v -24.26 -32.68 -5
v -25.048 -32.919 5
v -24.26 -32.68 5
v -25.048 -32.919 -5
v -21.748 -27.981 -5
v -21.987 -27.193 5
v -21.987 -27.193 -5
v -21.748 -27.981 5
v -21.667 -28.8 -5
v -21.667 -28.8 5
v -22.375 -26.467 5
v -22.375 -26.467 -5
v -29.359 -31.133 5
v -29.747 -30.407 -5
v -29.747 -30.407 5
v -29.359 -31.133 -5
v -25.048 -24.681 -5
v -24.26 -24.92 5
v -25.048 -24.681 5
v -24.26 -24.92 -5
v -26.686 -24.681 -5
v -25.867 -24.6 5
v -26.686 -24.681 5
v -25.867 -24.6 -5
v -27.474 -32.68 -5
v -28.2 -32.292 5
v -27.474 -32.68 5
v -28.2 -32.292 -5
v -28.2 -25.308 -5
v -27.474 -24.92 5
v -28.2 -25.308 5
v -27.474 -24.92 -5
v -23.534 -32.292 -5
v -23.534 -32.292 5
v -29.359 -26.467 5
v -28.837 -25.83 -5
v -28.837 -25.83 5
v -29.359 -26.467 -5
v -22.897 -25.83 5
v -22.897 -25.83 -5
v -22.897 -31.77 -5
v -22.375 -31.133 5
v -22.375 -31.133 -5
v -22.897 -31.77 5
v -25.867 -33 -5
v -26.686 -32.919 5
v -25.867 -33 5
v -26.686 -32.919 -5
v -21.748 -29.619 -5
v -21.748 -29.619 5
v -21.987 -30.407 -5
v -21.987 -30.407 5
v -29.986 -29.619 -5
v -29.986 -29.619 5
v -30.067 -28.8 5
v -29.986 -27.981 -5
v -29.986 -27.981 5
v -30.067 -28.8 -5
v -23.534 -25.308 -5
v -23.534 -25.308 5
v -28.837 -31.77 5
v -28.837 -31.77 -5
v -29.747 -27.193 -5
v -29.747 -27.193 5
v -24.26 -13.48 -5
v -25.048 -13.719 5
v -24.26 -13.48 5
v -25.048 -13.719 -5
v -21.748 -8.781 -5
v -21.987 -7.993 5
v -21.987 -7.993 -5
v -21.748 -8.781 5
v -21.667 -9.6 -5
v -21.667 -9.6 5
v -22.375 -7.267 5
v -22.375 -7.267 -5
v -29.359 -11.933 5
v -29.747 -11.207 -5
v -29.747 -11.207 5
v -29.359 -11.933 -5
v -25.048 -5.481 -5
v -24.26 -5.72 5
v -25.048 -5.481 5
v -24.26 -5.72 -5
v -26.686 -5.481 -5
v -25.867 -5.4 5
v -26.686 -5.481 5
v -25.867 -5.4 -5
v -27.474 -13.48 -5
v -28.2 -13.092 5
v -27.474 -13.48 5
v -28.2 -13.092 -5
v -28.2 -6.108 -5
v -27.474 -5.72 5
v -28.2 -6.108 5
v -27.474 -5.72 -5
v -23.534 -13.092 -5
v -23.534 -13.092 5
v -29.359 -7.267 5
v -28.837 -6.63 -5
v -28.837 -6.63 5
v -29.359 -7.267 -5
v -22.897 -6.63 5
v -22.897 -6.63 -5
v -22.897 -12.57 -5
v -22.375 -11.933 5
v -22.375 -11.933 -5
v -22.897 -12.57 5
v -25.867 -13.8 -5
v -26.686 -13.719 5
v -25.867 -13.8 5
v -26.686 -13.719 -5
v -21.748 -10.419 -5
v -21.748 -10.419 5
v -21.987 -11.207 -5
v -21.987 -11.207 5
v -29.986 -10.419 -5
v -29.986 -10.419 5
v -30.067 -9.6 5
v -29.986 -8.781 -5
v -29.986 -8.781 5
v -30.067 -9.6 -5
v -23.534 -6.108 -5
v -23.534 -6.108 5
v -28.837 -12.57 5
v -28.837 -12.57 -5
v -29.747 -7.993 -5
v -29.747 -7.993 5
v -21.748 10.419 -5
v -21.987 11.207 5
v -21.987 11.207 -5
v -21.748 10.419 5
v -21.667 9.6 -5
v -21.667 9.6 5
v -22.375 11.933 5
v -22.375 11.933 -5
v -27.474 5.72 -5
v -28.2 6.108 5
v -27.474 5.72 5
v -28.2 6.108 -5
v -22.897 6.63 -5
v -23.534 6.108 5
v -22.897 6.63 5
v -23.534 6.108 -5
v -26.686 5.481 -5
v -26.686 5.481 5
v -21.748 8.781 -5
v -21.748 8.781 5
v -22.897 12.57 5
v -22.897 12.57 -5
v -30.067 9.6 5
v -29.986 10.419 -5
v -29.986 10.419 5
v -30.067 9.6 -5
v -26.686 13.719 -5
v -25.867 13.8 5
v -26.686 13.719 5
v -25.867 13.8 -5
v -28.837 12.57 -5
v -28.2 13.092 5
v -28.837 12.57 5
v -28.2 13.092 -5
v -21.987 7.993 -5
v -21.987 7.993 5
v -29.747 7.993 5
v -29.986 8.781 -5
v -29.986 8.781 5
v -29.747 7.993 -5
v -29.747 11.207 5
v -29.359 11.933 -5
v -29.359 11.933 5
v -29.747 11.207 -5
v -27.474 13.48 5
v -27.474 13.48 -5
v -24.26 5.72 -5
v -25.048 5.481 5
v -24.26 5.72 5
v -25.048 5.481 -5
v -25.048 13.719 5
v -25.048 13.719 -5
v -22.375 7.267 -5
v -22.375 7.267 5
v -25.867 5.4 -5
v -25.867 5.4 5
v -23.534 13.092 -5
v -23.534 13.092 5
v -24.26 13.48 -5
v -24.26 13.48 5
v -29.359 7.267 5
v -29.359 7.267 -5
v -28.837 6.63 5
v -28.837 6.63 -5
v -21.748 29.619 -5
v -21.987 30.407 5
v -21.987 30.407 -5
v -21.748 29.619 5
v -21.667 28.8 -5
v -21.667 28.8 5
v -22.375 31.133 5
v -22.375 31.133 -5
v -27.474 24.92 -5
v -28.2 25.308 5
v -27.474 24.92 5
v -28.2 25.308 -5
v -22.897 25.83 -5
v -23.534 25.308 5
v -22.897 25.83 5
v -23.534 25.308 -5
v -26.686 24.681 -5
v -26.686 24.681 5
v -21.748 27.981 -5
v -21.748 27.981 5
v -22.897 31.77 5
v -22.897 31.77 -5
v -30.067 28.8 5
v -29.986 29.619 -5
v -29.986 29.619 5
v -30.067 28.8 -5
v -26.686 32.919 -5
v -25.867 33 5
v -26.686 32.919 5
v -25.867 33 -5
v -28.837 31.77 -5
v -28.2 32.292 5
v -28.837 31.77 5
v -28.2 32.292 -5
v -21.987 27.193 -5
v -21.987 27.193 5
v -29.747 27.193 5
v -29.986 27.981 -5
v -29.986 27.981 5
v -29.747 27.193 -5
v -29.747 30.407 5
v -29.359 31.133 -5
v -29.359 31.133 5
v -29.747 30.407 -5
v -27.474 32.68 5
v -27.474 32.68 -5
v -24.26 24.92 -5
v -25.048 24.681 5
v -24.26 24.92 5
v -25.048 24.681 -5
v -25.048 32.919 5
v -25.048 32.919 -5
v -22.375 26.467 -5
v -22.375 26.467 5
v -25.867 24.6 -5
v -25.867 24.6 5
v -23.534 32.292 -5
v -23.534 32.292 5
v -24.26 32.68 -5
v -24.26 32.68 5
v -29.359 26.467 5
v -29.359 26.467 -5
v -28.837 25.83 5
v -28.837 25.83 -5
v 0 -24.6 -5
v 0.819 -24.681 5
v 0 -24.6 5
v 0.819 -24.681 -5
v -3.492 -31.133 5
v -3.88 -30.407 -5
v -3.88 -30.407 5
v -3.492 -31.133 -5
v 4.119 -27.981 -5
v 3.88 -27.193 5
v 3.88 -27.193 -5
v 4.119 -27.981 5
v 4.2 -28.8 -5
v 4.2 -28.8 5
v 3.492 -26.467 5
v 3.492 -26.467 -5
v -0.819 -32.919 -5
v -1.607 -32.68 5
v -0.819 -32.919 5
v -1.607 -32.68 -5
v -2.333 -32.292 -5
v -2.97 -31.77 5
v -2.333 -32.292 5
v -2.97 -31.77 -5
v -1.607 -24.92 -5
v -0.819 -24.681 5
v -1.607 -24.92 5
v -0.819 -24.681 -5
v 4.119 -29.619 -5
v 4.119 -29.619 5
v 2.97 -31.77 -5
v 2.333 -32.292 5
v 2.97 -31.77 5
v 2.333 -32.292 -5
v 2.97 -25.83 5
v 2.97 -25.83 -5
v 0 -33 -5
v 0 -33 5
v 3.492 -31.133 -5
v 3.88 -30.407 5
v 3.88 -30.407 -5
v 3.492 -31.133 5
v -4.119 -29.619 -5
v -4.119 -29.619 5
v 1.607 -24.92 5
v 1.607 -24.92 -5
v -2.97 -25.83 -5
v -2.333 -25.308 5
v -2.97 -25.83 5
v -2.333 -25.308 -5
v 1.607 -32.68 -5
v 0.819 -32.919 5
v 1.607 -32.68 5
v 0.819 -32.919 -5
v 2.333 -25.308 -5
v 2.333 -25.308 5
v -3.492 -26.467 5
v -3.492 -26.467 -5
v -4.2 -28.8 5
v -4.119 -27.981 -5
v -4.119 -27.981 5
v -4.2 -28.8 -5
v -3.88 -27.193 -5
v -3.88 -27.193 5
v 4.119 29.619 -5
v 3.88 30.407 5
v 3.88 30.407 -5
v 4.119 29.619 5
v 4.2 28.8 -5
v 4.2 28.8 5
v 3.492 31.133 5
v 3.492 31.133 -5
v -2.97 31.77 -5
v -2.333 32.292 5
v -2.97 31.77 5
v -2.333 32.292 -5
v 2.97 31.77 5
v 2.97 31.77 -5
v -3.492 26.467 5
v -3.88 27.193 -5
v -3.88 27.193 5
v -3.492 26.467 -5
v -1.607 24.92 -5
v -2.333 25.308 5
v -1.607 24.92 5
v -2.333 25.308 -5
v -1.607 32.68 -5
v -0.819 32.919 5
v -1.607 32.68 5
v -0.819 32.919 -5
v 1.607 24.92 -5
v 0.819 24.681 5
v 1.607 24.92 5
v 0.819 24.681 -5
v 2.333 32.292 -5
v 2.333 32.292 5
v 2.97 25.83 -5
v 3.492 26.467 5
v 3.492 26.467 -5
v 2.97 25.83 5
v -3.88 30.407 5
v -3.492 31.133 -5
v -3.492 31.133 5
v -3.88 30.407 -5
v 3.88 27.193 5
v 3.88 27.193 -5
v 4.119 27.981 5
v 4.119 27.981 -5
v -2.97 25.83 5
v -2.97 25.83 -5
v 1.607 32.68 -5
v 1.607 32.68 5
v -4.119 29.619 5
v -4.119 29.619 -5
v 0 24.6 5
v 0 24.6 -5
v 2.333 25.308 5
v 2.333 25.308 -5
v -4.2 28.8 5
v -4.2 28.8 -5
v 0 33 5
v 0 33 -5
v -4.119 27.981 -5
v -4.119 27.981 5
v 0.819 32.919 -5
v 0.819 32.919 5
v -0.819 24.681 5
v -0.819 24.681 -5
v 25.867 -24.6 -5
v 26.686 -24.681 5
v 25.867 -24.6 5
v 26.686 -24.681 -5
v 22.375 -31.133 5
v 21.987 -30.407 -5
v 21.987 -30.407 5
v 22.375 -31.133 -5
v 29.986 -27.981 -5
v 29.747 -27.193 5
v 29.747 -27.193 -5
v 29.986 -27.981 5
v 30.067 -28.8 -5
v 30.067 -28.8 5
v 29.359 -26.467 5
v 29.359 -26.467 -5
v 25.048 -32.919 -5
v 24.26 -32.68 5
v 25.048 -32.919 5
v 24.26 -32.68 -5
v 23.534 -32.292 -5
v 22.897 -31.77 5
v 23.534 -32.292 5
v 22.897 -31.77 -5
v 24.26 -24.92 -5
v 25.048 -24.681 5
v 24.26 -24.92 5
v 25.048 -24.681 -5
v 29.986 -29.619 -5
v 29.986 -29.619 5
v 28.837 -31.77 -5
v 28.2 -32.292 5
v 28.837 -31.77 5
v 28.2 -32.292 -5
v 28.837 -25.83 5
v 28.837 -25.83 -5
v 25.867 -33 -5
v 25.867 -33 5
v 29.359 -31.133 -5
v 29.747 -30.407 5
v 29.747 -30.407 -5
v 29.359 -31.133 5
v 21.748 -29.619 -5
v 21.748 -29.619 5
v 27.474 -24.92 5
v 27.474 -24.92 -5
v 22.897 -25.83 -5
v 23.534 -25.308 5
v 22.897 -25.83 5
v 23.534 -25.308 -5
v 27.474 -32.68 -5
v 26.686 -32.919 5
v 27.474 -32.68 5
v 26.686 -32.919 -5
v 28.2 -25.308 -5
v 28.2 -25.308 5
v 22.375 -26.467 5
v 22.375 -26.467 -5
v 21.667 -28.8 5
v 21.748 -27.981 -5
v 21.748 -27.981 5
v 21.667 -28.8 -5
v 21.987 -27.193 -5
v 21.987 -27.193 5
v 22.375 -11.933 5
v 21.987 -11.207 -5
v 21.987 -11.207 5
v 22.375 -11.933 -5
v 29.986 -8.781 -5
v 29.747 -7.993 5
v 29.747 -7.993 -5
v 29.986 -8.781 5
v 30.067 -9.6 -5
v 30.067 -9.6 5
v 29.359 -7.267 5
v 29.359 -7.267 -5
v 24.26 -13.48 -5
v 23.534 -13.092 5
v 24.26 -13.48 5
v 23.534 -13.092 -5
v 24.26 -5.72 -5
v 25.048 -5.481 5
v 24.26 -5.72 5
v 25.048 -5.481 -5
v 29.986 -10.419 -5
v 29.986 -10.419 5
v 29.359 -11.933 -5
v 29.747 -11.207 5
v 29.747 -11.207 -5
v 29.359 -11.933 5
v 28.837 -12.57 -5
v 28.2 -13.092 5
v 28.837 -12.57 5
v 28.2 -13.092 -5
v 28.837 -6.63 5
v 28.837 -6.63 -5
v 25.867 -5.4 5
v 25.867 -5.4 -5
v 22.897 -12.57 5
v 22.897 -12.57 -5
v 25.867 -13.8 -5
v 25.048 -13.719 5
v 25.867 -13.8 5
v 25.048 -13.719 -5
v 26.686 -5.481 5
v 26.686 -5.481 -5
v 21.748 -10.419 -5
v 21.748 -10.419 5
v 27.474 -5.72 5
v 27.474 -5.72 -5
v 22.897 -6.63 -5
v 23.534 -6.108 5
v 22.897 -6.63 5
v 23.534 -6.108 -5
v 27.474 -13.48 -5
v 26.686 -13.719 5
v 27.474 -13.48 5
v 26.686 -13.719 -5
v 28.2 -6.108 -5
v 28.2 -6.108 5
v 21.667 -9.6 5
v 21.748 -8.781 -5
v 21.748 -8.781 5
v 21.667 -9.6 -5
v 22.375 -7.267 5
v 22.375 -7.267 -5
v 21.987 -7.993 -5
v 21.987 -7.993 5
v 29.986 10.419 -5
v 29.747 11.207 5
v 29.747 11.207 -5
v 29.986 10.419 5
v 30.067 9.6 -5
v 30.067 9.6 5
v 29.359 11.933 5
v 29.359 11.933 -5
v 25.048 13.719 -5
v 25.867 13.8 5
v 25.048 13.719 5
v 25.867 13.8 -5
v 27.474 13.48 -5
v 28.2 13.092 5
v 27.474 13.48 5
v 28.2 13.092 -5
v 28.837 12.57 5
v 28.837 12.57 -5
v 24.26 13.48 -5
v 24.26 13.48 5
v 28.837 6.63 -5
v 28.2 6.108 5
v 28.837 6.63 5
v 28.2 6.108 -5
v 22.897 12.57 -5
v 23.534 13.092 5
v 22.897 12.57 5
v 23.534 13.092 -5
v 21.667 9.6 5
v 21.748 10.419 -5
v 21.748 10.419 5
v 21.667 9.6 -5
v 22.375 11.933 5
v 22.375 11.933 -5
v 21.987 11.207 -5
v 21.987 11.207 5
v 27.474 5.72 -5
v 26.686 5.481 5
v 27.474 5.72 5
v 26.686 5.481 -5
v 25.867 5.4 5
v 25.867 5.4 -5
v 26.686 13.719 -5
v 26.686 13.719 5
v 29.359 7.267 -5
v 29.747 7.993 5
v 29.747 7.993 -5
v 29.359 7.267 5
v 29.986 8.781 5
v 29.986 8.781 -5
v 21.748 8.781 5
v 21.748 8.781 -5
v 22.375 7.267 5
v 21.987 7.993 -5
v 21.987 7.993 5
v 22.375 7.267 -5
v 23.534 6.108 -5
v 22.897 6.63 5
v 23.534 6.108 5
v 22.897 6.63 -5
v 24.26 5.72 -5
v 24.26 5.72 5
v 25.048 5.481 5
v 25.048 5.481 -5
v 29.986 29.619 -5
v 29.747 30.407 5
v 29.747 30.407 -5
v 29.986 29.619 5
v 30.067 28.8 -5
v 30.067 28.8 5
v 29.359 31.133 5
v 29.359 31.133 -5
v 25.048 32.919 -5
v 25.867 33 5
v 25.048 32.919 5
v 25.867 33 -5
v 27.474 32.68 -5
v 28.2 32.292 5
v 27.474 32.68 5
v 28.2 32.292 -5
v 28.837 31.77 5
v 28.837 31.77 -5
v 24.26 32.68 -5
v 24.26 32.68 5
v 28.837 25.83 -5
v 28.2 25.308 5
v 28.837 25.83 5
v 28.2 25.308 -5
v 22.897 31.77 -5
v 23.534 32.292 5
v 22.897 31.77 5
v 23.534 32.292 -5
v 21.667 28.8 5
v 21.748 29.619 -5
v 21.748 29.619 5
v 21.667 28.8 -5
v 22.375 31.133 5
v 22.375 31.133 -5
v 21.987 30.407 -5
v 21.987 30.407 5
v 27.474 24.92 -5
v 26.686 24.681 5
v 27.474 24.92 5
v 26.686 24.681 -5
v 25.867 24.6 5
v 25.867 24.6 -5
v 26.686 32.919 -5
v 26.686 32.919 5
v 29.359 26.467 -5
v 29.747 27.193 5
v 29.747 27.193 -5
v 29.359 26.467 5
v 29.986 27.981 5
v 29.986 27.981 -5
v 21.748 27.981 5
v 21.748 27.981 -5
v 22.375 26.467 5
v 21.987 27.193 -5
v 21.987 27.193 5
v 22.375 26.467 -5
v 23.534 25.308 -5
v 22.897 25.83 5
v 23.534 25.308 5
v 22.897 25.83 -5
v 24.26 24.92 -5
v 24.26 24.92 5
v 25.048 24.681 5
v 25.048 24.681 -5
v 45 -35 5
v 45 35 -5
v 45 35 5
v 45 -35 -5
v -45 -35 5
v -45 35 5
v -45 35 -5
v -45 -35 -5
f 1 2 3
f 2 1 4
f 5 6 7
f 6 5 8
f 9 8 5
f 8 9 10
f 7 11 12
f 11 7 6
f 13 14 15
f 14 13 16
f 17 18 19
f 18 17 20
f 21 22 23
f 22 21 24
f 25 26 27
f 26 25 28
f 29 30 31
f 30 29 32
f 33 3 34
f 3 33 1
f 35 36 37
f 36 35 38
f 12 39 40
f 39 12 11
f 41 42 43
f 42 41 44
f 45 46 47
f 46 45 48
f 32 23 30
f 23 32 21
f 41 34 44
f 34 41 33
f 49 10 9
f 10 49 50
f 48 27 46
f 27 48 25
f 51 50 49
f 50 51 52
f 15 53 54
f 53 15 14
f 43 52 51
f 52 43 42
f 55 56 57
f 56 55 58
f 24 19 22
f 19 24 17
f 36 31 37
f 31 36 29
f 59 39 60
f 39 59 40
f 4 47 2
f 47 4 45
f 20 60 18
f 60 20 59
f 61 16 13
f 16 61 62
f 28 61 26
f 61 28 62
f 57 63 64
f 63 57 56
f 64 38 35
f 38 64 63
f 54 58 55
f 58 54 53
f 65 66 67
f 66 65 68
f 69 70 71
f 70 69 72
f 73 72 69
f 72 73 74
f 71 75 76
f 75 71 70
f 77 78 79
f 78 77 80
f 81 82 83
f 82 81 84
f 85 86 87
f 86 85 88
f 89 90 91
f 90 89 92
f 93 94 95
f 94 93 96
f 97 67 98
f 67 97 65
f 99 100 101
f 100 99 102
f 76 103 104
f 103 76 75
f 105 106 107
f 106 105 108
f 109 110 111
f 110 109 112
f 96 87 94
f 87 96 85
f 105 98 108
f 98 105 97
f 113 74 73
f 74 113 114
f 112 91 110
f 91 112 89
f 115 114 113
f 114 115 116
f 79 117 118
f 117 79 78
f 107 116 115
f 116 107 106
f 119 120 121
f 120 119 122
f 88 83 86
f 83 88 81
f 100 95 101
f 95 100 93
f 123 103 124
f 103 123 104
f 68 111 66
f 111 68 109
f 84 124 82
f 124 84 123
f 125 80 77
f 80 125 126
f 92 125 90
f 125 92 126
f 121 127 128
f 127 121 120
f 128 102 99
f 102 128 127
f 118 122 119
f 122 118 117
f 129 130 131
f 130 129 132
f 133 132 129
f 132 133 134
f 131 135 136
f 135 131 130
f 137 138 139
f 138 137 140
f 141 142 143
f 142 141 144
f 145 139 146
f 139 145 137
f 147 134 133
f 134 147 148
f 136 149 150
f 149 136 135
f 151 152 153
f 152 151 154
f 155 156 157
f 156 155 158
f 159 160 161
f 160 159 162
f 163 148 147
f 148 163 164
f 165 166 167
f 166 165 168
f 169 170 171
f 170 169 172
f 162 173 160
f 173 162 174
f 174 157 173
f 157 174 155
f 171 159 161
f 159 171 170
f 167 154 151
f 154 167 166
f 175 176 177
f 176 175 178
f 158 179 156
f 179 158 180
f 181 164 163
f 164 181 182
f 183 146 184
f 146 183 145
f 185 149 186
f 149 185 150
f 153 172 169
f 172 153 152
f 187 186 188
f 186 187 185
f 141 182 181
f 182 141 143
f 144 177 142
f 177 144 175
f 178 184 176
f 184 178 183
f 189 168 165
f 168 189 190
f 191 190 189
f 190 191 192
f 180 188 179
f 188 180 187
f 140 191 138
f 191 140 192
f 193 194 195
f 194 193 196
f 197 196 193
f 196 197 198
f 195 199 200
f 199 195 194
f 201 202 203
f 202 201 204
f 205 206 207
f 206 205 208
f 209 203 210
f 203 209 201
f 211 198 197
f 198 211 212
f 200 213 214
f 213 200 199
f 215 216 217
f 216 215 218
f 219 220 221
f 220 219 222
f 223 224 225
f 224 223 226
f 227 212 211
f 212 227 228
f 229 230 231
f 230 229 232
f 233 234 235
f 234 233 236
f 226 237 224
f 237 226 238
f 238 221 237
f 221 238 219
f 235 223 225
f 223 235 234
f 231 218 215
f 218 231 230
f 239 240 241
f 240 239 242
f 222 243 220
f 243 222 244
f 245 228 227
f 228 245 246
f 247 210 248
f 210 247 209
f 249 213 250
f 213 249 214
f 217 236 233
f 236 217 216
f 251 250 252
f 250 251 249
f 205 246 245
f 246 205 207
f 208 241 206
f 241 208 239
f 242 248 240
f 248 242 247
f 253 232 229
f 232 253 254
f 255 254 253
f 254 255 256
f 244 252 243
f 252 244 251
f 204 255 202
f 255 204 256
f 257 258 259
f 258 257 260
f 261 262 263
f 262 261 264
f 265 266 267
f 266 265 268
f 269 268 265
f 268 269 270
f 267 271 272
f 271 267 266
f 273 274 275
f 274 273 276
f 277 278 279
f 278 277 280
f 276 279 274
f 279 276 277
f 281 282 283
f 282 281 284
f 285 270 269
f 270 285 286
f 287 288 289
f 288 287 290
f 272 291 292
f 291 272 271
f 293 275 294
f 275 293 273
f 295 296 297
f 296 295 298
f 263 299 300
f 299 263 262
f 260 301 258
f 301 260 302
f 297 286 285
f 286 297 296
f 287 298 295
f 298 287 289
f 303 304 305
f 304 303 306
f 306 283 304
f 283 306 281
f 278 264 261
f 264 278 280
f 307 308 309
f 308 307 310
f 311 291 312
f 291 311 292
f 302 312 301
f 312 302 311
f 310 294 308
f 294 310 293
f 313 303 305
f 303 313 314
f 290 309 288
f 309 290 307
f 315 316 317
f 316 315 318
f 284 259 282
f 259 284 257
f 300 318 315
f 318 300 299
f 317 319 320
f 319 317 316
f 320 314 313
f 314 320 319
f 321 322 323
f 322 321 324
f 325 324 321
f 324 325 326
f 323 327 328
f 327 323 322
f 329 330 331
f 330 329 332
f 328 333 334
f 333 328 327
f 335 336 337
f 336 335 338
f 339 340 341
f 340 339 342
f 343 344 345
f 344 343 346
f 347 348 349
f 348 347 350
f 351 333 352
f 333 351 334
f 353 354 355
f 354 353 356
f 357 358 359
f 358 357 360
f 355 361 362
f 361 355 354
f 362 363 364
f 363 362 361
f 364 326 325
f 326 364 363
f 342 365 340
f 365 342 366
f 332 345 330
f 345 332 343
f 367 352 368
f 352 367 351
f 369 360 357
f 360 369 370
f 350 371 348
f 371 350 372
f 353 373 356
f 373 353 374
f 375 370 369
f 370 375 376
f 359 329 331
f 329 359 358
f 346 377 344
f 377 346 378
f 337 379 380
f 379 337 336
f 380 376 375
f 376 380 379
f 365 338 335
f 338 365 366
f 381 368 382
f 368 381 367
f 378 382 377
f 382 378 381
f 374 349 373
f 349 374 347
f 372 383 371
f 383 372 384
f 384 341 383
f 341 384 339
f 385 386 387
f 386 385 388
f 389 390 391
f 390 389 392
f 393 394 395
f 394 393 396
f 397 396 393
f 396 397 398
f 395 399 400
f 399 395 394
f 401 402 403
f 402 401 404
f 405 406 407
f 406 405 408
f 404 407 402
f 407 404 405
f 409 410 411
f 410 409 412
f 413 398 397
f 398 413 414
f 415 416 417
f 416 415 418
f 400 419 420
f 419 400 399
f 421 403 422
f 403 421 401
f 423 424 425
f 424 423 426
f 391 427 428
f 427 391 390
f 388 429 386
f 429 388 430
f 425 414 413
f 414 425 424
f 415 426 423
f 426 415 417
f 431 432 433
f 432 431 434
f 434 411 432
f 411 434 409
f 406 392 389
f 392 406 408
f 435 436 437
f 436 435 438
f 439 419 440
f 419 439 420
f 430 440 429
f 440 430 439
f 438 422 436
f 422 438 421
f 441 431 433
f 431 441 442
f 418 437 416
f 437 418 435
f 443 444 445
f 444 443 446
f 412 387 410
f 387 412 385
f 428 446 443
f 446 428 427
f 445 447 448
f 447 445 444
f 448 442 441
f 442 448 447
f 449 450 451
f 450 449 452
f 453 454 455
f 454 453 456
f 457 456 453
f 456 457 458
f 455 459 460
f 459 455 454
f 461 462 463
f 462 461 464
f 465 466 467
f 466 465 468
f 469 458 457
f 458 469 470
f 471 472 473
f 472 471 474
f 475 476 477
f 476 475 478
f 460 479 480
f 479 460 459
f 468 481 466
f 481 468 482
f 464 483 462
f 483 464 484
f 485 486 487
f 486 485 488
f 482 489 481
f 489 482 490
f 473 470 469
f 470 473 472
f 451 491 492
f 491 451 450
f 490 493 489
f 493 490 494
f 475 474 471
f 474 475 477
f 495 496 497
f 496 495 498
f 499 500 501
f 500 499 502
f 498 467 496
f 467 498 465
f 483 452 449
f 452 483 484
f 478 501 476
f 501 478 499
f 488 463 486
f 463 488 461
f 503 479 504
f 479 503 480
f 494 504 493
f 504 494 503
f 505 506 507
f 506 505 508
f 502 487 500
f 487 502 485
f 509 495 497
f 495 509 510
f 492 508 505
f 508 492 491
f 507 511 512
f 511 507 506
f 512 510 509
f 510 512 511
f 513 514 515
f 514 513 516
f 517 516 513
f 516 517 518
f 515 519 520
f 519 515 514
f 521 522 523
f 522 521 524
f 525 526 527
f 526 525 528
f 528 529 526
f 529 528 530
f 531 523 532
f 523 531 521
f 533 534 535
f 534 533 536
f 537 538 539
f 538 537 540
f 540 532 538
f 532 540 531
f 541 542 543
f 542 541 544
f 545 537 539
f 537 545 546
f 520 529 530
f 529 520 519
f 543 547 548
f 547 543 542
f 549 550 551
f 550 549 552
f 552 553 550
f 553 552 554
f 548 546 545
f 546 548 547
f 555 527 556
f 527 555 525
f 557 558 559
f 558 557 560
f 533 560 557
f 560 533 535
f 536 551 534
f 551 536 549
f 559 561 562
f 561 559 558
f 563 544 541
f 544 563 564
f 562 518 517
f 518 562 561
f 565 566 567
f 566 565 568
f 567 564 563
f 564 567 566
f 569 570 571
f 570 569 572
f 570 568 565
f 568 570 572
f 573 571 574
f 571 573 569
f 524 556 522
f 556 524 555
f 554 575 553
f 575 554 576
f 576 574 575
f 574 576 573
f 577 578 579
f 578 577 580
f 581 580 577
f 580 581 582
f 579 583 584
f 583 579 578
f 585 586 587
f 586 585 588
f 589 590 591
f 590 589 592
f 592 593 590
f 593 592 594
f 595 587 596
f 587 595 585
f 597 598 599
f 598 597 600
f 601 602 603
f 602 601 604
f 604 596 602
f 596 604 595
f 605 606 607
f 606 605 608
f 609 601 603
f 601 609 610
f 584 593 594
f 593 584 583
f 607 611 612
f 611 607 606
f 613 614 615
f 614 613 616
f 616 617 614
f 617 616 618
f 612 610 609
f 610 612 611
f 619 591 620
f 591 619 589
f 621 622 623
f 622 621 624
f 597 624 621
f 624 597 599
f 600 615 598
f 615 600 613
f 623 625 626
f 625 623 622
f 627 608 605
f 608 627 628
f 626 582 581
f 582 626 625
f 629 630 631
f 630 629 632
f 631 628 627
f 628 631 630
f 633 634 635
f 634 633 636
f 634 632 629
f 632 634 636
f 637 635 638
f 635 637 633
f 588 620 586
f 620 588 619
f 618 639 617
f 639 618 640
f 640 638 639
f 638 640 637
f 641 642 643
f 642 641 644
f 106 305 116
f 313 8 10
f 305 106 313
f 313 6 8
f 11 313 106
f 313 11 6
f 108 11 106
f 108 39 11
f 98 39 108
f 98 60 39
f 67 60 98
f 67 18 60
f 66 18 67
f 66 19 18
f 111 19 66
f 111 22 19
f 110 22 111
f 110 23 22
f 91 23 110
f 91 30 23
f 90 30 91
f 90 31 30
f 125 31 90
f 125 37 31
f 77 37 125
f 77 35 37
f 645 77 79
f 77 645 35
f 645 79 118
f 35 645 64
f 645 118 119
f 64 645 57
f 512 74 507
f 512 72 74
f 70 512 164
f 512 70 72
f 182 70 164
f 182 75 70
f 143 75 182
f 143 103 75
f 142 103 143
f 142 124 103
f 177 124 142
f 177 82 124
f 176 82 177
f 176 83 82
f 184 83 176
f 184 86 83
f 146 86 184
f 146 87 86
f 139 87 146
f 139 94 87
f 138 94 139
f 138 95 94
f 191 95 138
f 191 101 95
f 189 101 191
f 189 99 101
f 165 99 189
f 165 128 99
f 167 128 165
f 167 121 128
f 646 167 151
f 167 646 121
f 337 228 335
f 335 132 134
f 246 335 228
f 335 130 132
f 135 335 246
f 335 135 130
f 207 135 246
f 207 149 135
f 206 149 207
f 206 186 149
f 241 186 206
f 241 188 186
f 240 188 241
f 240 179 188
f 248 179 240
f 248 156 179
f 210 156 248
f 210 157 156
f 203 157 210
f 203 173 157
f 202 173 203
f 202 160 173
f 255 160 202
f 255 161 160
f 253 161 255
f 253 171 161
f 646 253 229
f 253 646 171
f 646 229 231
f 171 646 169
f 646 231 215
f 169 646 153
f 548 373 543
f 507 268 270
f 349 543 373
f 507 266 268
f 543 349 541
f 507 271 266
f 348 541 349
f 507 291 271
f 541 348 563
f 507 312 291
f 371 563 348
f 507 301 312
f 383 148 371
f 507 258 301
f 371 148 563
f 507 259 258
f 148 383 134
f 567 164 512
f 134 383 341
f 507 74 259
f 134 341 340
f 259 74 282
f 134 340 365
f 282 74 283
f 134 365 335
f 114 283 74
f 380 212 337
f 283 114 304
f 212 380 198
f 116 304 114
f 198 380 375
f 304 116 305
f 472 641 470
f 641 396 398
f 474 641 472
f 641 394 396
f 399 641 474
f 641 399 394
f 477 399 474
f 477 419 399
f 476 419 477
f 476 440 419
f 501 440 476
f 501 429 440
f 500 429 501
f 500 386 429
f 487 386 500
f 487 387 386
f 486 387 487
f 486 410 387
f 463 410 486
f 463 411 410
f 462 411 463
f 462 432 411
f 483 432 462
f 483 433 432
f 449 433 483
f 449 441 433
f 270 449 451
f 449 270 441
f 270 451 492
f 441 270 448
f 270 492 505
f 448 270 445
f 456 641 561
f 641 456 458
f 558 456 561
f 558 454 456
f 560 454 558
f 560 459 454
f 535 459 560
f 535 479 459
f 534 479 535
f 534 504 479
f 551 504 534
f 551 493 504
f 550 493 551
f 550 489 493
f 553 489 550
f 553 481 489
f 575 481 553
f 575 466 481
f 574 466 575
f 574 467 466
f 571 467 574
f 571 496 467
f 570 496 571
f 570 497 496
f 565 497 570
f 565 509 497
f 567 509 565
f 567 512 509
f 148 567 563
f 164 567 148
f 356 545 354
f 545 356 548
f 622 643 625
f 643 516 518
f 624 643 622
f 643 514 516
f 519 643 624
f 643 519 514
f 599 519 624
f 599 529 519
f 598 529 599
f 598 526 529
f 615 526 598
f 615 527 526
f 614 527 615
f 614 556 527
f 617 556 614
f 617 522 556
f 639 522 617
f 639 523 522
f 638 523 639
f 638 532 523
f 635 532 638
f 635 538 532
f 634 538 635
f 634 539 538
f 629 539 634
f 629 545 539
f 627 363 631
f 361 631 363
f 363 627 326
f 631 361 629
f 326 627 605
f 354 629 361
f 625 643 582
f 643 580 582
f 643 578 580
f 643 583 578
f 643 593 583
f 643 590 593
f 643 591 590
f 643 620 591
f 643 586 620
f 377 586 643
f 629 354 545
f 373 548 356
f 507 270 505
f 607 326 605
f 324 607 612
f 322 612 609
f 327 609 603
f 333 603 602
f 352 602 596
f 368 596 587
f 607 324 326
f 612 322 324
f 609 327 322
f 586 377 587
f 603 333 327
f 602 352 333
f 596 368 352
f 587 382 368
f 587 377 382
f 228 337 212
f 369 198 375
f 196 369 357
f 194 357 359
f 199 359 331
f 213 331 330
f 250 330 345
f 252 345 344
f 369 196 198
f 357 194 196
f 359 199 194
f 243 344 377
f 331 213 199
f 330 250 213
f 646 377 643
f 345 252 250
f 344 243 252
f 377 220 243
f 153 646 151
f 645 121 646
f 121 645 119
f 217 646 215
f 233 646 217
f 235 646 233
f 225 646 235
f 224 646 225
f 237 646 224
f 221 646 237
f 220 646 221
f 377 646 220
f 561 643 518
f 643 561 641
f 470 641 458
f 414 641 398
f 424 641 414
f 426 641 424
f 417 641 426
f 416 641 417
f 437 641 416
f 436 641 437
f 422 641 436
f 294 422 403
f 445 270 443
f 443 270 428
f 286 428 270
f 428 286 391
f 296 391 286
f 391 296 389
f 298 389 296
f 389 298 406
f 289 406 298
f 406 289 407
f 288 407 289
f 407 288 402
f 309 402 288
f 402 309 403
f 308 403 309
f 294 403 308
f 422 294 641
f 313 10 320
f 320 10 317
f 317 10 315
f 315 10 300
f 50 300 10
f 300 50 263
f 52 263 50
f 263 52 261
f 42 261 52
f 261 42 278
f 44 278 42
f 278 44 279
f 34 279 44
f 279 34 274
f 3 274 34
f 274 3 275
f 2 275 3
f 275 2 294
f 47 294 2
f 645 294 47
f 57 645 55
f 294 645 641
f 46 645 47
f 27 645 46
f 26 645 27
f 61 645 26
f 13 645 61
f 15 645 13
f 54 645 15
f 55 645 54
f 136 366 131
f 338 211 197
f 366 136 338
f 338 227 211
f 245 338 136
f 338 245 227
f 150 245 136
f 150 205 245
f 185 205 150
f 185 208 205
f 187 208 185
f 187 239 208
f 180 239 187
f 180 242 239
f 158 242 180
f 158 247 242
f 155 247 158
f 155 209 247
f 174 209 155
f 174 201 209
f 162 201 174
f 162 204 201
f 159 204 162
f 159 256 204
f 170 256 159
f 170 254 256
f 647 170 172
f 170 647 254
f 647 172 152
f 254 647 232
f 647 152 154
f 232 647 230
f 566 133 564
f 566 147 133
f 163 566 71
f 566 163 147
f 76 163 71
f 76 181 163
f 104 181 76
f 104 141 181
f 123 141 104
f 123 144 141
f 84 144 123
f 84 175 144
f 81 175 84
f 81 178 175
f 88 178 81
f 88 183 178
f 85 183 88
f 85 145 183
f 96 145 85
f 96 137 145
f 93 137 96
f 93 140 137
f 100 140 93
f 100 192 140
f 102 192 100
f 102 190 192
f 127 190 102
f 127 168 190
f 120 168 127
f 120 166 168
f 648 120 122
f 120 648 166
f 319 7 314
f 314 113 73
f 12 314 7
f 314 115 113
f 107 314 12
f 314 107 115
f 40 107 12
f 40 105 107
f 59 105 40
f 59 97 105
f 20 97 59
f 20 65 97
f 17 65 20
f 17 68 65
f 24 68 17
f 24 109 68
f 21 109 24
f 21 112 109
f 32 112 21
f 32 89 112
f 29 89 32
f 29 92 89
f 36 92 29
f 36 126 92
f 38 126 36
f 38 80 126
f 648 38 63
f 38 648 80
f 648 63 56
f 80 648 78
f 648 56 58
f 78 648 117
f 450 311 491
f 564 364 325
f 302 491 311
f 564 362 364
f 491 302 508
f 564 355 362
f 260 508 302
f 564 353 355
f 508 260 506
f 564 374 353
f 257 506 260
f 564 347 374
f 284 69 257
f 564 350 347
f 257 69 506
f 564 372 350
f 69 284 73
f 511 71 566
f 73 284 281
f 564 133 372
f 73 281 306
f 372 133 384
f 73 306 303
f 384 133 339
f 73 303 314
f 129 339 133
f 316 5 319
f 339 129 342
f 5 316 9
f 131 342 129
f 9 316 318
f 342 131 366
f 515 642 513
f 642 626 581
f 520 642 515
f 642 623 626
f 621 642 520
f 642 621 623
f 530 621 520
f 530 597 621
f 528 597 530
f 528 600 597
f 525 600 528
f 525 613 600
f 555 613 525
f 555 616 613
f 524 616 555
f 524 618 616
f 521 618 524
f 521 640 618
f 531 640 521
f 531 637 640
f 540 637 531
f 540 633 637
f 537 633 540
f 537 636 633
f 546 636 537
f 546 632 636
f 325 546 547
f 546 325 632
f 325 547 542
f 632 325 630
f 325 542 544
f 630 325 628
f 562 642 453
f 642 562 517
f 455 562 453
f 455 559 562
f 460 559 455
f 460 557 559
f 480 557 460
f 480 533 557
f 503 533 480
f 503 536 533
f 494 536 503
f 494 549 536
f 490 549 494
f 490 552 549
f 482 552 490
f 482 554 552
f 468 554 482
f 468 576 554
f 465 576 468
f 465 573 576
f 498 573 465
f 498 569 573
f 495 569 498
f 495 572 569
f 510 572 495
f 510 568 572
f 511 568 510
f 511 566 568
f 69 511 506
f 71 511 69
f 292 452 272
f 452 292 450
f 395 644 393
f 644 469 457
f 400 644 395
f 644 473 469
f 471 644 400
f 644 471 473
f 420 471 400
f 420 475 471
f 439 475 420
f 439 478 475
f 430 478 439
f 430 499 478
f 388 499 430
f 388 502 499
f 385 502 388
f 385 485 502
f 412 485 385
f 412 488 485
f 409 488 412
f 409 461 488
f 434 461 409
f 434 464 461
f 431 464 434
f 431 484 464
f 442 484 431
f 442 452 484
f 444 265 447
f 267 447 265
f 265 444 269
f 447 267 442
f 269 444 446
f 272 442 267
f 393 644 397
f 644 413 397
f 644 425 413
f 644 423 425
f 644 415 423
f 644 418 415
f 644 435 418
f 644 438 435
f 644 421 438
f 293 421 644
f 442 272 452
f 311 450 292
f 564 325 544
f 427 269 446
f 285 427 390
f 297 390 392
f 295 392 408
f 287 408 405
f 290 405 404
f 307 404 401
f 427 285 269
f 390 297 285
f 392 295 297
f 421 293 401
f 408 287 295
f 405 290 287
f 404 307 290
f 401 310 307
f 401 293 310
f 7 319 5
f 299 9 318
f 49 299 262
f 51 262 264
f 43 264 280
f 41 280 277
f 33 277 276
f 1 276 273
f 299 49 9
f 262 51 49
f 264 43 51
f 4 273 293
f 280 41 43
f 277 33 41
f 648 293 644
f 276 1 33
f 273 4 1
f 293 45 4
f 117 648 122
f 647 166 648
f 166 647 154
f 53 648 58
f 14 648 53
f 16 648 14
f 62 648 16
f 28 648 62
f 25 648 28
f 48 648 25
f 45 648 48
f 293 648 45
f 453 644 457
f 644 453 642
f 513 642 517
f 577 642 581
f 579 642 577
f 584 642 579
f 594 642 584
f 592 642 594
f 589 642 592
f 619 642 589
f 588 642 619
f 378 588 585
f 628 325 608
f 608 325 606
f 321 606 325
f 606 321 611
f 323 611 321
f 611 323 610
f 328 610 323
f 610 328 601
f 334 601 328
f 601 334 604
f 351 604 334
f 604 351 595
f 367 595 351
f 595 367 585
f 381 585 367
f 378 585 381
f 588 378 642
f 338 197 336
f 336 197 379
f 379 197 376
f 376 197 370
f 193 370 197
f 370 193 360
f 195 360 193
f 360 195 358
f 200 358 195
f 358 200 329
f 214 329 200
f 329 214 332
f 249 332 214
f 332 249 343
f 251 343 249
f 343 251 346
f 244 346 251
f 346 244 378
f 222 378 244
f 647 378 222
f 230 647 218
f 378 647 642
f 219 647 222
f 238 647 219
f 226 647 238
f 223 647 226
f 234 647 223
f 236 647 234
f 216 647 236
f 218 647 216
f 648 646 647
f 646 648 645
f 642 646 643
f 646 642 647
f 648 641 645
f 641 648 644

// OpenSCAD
$fn = 32;

// ----------------------------------------------------------------------
// Perforated panel 90 x 70 x 10
// 4 x 3 Ø8.4 holes, frame layout
// ----------------------------------------------------------------------

// --- parameters (mm) ---
panel = [90, 70, 10];  // overall size (x, y, z)
hole_d = 8.4;          // hole diameter
pitch_x = 25.867;      // hole pitch along X
pitch_y = 19.2;        // hole pitch along Y

// --- derived feature positions (mm) ---
margin = hole_d / 2 + 2;            // = 6.2   clearance from the panel edge
cols = floor((panel[0] - 2 * margin) / pitch_x) + 1;  // = 3   how many columns fit in X
rows = floor((panel[1] - 2 * margin) / pitch_y) + 1;  // = 4   how many rows fit in Y
span_x = (cols - 1) * pitch_x + 0;  // = 51.73   width of the field
span_y = (rows - 1) * pitch_y;      // = 57.6   height of the field
origin_x = -span_x / 2;             // = -25.87   X of the first hole
origin_y = -span_y / 2;             // = -28.8   Y of the first row
holes = 2 * cols + 2 * (rows - 2);  // = 10   holes around the frame
feature_centers = [
  [origin_x + 0 * pitch_x, origin_y + 0 * pitch_y],
  [origin_x + 0 * pitch_x, origin_y + 1 * pitch_y],
  [origin_x + 0 * pitch_x, origin_y + 2 * pitch_y],
  [origin_x + 0 * pitch_x, origin_y + 3 * pitch_y],
  [origin_x + 1 * pitch_x, origin_y + 0 * pitch_y],
  [origin_x + 1 * pitch_x, origin_y + 3 * pitch_y],
  [origin_x + 2 * pitch_x, origin_y + 0 * pitch_y],
  [origin_x + 2 * pitch_x, origin_y + 1 * pitch_y],
  [origin_x + 2 * pitch_x, origin_y + 2 * pitch_y],
  [origin_x + 2 * pitch_x, origin_y + 3 * pitch_y]
];   // hole centres, used verbatim by the cutter loop

// panel outline, every hole through
difference() {
  cube(panel, center = true);
  for (centre = feature_centers)
    translate([centre[0], centre[1], 0])
      cylinder(d = hole_d, h = panel[2] + 2, center = true);
}
